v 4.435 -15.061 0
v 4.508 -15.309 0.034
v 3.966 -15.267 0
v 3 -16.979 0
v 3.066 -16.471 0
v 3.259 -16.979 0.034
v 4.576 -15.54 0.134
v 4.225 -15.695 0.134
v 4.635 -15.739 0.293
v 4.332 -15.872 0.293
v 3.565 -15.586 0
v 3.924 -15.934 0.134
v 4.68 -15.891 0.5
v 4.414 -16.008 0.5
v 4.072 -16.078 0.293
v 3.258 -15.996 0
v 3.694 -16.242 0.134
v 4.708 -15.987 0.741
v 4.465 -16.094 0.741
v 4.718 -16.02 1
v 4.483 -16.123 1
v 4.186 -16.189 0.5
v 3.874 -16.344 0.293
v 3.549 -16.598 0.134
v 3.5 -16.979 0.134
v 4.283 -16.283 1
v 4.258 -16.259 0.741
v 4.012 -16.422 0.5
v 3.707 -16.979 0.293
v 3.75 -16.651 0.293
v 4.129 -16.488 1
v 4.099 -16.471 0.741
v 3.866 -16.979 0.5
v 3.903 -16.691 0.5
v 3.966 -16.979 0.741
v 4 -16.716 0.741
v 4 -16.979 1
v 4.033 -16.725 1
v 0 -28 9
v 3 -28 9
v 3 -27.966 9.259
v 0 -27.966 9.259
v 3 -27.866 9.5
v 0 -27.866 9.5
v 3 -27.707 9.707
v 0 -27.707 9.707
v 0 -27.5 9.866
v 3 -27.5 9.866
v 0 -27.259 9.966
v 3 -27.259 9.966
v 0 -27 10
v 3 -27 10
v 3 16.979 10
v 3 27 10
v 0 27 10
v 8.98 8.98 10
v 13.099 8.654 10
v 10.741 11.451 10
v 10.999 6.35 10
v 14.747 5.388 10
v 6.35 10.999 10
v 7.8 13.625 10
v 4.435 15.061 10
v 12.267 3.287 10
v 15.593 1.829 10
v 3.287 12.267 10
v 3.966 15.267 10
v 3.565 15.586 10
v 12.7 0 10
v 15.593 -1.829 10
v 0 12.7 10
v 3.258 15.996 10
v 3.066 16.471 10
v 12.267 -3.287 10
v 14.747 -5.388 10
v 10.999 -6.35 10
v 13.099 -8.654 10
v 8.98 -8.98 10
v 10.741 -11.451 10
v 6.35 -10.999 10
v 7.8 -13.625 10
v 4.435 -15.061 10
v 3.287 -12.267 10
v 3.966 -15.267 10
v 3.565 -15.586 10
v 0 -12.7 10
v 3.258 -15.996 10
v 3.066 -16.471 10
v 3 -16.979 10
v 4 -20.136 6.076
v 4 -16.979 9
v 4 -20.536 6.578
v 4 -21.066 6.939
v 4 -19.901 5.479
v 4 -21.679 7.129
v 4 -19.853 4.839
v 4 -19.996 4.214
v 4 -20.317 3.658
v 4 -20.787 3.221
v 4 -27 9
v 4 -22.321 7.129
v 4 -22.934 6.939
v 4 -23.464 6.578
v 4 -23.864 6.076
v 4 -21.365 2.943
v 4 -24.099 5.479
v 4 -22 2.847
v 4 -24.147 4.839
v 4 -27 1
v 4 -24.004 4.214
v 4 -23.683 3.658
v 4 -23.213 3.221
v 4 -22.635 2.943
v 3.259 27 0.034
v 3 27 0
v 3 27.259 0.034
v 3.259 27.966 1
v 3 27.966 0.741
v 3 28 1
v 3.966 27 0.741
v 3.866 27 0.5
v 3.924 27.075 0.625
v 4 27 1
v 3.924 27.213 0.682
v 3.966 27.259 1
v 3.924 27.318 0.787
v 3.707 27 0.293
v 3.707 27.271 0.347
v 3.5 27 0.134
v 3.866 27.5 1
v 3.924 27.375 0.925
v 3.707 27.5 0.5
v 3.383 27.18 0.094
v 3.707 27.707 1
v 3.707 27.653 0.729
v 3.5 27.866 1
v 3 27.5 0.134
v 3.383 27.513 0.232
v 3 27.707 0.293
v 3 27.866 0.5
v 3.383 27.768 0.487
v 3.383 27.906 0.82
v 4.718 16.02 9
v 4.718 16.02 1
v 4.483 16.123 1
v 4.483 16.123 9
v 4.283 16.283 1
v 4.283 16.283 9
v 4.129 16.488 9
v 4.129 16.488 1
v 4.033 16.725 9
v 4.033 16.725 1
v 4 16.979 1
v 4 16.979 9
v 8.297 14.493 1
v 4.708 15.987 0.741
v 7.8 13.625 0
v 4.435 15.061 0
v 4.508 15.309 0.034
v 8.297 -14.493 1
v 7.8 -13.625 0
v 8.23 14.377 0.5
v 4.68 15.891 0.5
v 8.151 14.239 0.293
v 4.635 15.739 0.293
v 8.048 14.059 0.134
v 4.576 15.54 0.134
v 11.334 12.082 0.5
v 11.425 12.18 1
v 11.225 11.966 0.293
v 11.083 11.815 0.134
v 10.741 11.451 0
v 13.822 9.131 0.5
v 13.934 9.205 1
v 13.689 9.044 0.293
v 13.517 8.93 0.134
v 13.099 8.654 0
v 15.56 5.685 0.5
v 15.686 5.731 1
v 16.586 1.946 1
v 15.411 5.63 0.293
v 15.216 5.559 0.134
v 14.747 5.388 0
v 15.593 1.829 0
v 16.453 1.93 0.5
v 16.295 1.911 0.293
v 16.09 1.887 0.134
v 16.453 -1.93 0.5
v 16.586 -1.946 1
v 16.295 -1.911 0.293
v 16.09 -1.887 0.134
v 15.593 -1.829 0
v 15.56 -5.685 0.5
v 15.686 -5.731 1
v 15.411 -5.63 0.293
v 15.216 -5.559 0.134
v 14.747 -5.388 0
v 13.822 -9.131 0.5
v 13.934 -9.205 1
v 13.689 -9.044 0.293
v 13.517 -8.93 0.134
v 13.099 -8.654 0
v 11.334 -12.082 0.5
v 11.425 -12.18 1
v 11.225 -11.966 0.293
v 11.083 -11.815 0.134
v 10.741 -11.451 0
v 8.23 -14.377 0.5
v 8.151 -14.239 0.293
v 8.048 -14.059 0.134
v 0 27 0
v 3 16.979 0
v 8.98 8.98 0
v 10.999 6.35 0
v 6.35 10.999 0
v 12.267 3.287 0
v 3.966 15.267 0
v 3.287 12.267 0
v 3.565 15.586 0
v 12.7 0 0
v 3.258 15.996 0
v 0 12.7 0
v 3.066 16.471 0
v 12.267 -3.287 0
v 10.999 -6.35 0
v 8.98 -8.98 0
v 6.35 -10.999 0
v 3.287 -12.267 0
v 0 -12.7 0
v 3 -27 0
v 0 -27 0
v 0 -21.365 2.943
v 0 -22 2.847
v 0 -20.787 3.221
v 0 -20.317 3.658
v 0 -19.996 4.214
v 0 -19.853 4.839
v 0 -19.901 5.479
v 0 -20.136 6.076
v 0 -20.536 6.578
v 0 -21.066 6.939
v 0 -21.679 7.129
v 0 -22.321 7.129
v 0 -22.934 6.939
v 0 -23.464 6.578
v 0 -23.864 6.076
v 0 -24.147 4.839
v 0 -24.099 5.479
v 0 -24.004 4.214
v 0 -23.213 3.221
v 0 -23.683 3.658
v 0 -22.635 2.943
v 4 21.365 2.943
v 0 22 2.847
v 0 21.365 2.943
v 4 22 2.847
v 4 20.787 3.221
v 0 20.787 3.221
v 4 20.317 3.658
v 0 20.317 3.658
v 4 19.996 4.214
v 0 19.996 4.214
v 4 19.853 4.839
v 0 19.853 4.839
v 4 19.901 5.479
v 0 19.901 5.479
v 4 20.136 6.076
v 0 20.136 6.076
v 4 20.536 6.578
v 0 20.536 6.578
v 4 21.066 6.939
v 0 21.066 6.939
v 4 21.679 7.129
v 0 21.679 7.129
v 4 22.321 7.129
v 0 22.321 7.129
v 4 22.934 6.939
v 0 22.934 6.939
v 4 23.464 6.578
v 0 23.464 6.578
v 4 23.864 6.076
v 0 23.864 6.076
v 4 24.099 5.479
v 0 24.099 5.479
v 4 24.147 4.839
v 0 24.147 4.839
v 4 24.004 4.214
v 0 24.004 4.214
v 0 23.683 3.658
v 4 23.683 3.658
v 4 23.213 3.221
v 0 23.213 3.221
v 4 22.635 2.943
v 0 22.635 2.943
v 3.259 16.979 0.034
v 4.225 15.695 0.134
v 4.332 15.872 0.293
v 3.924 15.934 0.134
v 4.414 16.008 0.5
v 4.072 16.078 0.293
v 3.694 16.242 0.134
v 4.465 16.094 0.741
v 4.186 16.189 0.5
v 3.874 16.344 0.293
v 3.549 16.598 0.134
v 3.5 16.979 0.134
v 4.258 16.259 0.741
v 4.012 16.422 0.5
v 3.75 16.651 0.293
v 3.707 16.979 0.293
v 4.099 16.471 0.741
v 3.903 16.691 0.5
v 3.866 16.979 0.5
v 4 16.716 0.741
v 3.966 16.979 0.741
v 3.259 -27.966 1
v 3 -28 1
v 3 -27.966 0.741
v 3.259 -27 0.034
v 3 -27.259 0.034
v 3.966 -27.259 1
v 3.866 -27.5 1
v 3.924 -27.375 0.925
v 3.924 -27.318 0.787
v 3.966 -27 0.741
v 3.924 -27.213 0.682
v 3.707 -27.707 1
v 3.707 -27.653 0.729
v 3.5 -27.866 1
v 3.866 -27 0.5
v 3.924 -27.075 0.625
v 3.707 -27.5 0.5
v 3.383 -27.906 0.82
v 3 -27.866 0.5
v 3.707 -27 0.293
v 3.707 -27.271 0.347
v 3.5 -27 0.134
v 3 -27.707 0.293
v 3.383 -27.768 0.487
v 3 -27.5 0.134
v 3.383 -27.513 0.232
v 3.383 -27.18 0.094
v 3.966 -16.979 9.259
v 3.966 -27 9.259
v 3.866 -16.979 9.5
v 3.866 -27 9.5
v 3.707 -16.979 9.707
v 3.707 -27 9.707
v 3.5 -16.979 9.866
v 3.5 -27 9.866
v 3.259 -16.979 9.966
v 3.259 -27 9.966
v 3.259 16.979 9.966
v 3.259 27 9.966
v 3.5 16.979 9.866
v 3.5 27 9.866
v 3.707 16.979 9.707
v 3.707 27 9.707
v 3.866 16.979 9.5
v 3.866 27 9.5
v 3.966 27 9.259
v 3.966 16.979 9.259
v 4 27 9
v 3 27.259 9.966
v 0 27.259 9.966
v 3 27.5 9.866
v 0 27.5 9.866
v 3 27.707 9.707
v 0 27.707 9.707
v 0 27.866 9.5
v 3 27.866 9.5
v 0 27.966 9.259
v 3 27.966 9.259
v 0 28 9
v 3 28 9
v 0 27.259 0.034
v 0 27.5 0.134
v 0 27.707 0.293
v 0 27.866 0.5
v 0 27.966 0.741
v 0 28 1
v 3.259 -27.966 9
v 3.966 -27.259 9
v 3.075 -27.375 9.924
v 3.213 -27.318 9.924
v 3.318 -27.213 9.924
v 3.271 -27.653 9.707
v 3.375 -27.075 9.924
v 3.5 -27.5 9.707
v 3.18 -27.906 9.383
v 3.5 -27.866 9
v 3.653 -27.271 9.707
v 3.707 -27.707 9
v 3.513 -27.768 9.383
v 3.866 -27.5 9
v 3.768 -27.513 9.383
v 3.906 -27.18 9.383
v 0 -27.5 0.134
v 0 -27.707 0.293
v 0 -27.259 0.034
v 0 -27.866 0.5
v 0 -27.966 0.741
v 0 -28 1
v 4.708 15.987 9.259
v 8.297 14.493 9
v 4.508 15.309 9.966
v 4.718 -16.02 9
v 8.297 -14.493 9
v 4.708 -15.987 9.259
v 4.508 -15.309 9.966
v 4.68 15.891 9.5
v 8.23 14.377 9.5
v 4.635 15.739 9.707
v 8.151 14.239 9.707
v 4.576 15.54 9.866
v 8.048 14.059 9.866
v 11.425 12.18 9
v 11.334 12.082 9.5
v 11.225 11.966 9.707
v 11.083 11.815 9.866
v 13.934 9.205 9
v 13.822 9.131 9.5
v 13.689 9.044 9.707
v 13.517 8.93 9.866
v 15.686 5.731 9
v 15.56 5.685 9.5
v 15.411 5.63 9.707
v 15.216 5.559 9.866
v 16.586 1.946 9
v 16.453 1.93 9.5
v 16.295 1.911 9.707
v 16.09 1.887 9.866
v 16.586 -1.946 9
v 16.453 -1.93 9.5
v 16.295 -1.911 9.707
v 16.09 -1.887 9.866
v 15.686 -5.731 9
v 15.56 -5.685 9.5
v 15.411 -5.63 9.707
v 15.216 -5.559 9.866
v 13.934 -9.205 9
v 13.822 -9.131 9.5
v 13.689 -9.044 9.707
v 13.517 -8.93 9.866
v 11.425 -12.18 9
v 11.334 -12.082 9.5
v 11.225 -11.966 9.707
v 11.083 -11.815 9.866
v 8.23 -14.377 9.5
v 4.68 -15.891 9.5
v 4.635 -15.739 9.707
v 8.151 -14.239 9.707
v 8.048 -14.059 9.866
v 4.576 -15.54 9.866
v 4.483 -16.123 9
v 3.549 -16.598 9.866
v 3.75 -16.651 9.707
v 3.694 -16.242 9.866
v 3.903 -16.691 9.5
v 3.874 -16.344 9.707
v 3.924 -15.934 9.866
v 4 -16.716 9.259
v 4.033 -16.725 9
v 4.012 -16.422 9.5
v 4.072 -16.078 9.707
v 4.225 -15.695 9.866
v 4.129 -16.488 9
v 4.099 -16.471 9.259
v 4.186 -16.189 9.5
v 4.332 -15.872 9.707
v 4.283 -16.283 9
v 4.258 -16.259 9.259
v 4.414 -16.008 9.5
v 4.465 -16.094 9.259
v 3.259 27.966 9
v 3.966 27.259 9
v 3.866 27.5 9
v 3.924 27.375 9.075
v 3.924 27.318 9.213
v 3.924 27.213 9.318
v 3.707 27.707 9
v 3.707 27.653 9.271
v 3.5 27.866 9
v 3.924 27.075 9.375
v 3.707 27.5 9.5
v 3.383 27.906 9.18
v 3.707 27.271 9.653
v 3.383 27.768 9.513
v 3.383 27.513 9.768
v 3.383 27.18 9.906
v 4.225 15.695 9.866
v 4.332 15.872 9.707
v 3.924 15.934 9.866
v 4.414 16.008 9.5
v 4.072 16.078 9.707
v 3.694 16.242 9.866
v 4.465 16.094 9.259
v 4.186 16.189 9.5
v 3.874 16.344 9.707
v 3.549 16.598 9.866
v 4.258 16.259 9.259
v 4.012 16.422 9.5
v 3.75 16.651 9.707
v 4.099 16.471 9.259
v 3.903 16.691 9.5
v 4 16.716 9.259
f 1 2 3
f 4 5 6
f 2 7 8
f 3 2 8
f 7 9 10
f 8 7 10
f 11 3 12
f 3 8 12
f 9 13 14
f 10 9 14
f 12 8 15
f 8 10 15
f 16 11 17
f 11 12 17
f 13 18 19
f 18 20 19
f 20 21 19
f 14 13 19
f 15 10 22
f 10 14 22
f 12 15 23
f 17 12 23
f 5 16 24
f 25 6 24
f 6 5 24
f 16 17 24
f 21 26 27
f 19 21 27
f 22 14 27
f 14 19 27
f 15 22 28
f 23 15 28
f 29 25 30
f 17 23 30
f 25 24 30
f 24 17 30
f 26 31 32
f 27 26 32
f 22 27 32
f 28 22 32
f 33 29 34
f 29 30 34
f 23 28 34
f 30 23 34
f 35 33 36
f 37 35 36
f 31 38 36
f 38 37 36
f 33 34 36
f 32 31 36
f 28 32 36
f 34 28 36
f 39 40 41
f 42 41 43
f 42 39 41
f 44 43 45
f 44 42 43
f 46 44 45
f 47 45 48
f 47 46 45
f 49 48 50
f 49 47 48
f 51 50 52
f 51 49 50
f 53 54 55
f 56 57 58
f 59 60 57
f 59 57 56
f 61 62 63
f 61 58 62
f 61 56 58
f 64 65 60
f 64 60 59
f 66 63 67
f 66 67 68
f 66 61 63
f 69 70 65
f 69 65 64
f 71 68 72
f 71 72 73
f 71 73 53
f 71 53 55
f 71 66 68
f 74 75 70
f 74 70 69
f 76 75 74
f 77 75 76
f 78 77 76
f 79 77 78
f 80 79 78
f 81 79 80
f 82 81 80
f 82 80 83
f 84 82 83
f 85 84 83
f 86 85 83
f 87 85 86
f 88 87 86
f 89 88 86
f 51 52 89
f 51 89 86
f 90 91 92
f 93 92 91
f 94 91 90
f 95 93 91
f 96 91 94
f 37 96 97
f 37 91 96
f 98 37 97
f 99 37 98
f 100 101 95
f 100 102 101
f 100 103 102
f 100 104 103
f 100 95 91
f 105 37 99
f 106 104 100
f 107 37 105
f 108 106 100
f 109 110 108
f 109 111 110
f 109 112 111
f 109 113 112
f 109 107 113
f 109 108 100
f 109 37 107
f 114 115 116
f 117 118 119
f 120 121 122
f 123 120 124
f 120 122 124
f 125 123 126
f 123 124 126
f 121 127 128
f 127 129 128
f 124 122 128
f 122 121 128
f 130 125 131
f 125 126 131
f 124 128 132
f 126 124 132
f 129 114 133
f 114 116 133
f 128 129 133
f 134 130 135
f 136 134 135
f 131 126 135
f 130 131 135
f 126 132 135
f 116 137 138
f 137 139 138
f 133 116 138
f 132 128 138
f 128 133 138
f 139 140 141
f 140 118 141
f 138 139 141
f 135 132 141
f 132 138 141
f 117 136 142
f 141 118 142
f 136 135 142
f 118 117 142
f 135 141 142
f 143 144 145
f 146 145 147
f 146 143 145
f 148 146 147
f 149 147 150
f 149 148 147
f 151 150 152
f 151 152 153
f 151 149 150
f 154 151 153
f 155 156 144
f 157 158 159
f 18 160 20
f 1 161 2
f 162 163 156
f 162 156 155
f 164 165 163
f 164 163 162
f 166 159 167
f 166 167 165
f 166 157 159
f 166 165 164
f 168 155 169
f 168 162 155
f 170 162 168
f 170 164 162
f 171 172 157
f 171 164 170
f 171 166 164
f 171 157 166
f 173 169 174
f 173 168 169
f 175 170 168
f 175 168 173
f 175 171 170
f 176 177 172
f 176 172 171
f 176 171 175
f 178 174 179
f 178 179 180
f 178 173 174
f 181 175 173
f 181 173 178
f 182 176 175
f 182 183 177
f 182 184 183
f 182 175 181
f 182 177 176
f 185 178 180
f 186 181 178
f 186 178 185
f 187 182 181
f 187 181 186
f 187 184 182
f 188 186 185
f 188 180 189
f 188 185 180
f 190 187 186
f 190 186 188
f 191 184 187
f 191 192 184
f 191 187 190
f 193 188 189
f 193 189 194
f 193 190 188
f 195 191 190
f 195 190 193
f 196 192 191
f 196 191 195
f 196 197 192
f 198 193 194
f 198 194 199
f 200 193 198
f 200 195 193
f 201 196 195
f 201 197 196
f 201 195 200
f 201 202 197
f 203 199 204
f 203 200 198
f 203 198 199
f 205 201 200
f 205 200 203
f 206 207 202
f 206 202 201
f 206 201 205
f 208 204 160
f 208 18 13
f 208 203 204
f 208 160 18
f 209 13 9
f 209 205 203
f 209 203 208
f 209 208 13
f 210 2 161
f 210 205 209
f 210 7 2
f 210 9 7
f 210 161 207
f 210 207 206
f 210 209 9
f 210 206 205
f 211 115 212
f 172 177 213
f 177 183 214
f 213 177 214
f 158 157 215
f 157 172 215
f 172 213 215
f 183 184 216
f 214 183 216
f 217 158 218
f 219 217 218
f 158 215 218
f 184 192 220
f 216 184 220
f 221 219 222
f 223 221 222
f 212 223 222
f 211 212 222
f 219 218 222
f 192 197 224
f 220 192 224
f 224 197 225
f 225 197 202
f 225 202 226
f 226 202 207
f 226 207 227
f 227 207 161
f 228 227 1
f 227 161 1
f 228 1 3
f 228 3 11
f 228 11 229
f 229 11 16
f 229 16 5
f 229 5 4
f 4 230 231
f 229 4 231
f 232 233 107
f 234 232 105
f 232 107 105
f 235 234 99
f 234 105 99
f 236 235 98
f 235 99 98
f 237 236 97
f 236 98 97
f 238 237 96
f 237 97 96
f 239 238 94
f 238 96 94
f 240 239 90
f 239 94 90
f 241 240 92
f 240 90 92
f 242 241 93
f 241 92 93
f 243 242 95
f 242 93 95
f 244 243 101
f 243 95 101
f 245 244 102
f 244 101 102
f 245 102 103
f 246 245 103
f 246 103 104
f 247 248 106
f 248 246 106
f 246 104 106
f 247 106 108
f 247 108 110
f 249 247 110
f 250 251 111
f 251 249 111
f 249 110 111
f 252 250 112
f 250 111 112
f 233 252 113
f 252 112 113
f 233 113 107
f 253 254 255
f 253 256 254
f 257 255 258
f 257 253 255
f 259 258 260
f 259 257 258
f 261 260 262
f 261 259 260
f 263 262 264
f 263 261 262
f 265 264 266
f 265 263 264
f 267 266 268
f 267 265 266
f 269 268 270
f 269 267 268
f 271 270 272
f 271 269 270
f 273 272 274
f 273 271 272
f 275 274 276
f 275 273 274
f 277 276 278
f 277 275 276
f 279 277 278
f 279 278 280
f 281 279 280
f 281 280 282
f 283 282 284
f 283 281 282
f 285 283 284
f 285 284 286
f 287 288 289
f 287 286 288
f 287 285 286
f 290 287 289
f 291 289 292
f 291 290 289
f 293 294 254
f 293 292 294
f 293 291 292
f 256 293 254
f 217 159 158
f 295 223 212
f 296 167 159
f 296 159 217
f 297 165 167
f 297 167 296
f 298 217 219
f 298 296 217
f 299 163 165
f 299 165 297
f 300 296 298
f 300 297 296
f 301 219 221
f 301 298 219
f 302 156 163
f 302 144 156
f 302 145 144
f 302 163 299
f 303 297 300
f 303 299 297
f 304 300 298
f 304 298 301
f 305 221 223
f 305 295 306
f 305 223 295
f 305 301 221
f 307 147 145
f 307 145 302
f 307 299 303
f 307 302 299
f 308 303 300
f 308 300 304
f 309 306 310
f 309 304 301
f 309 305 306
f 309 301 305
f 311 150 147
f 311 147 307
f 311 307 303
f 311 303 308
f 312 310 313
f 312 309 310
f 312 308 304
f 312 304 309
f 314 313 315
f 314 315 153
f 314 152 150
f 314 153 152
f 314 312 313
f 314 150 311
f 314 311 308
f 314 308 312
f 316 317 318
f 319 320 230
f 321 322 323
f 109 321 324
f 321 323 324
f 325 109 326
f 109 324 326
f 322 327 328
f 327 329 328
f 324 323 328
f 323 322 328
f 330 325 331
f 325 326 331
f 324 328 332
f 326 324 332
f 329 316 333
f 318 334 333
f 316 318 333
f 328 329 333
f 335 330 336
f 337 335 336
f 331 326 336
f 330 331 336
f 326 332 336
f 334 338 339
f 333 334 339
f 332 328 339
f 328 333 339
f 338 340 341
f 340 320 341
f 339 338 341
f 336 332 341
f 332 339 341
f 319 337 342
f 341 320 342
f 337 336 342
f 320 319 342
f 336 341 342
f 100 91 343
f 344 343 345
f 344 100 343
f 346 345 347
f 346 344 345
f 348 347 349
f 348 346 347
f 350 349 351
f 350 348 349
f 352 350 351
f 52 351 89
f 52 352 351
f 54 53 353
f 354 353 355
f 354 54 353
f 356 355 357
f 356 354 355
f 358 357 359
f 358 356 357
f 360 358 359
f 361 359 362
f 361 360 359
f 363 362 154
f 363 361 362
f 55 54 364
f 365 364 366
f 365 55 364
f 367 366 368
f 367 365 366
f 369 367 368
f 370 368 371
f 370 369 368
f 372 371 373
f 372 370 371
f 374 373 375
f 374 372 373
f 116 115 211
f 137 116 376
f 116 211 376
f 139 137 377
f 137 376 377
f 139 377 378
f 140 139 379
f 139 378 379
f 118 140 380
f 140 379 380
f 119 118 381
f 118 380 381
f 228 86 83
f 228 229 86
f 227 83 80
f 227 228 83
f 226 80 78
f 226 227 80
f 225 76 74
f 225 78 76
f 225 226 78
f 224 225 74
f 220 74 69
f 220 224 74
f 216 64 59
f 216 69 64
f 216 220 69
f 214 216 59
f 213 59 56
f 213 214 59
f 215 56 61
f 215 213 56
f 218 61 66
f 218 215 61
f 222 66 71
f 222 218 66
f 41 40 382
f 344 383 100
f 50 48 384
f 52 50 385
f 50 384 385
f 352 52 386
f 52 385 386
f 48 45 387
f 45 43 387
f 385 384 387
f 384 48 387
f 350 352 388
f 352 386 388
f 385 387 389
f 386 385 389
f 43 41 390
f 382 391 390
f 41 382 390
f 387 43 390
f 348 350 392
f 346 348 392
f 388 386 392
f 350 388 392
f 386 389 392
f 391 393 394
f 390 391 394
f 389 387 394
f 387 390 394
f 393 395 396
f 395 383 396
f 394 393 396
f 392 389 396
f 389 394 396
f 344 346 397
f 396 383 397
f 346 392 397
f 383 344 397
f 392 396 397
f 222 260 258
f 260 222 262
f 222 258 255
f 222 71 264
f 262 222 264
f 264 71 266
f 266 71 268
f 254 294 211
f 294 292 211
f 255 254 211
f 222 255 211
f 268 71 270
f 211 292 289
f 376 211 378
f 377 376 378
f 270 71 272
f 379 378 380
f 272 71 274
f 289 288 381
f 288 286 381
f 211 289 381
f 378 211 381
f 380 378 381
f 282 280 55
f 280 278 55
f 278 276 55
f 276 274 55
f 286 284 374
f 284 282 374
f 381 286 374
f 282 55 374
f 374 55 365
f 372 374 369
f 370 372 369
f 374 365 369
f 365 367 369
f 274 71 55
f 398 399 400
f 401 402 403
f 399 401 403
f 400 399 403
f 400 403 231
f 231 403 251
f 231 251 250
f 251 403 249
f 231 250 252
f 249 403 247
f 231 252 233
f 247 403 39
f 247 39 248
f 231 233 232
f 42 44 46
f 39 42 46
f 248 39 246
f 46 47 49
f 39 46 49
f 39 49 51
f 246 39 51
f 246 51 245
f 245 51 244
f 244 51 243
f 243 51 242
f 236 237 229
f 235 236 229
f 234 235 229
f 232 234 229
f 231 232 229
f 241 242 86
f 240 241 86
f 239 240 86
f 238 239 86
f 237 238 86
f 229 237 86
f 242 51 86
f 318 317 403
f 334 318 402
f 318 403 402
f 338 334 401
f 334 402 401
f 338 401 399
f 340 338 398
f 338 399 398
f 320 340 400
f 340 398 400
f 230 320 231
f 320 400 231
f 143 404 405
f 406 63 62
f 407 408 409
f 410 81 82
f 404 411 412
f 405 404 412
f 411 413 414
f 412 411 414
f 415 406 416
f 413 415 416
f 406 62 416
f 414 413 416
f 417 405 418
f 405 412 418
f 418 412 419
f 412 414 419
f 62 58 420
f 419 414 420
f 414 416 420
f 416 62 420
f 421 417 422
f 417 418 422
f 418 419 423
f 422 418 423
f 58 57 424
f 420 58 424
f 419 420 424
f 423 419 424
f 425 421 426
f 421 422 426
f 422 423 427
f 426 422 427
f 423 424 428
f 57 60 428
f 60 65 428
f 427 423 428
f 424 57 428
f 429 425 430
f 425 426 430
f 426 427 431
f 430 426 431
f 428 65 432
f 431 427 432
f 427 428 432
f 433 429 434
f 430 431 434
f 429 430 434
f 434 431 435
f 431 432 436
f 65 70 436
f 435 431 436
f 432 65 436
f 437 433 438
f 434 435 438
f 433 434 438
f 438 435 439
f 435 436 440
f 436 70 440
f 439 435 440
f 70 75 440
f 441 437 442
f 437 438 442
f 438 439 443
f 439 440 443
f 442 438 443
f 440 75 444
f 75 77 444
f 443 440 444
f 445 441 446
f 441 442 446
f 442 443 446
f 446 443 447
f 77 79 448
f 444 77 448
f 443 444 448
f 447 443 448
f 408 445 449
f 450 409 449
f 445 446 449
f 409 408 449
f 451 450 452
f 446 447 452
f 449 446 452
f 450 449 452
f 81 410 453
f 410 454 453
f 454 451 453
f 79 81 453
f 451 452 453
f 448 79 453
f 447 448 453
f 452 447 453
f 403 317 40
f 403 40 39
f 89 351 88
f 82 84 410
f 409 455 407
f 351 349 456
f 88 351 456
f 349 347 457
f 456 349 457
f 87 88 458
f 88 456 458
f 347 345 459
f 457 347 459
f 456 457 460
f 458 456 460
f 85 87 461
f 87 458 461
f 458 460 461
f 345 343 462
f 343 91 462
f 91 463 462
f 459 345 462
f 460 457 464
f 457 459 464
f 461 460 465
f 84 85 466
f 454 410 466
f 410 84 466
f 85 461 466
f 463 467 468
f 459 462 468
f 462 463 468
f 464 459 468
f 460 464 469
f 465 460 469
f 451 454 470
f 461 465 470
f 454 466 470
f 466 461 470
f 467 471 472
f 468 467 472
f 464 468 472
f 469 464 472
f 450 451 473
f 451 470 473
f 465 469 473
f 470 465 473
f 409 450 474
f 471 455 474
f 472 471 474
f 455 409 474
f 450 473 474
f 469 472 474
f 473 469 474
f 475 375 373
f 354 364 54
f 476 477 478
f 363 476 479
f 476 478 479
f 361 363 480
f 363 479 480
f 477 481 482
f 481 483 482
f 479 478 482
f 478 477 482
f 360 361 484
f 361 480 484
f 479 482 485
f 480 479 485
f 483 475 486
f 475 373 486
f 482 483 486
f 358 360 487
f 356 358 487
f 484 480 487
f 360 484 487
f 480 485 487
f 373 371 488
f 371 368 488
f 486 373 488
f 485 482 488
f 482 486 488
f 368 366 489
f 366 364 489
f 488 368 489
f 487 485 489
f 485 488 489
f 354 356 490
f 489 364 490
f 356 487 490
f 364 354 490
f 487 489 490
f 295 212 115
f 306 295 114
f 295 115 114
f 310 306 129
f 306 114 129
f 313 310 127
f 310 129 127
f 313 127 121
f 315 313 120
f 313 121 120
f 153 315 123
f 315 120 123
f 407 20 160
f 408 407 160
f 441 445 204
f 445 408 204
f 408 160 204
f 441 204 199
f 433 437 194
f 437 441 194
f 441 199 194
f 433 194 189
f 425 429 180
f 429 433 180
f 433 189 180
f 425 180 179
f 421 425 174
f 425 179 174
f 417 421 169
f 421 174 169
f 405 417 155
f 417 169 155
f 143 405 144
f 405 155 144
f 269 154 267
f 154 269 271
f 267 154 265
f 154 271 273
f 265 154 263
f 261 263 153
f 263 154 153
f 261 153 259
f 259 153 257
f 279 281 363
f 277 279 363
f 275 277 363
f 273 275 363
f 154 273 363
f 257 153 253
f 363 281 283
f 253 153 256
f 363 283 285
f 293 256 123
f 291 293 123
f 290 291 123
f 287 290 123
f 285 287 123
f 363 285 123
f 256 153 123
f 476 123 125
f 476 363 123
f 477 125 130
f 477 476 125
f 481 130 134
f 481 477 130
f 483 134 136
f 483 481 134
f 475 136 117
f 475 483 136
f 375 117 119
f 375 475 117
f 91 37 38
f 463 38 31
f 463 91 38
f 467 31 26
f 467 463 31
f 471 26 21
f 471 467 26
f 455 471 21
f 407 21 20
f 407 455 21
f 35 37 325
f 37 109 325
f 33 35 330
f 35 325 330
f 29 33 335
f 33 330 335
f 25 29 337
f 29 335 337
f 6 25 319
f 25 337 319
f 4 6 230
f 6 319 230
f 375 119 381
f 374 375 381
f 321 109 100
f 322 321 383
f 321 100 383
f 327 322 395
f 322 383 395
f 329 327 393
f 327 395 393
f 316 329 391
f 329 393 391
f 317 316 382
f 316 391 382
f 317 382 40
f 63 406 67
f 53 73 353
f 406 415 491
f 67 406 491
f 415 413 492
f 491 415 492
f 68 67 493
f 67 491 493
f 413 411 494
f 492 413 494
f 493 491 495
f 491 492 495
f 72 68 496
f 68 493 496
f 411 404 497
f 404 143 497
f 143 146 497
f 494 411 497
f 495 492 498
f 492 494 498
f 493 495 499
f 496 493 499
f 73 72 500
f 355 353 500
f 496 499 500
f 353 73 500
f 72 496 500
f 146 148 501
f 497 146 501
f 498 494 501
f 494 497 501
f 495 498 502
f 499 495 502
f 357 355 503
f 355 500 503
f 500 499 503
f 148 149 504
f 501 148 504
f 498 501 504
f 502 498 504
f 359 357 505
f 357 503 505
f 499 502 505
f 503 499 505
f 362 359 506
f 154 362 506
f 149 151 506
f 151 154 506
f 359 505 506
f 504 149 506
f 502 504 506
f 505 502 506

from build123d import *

# Parameters (mm, degrees)
SKETCH1_R                                         = 16.7
SKETCH1_R_2                                       = 12.7
BOSS_EXTRUDE1_DEPTH                               = 10
SKETCH2_W                                         = 22.16607393
SKETCH2_H                                         = 10
SKETCH2_W_2                                       = 4
SKETCH2_H_2                                       = 30
BOSS_EXTRUDE2_DEPTH                               = 10
SKETCH4_W                                         = 8
SKETCH4_H                                         = 11.78611706
BOSS_EXTRUDE3_DEPTH                               = 10
FILLET3_R                                         = 1
CSK_FOR_6_FLAT_HEAD_MACHINE_SCREW_100_D           = 4.3053
CSK_FOR_6_FLAT_HEAD_MACHINE_SCREW_100_CSINK_D     = 7.0866
CSK_FOR_6_FLAT_HEAD_MACHINE_SCREW_100_CSINK_ANGLE = 100
INTERSECT3_START                                  = -42.1
INTERSECT3_OUTLINE_R                              = 2.15265
INTERSECT3_DEPTH                                  = 42.1


# Read off the part's stored shape, not the designer's step: CSK for #4 Flat Head Machine Screw (100)1, Intersect3
with BuildPart() as part:
    # Sketch1 → Boss-Extrude1 (new body)
    with BuildSketch(Plane.XY):
        Circle(SKETCH1_R)
        Circle(SKETCH1_R_2, mode=Mode.SUBTRACT)
    extrude(amount=BOSS_EXTRUDE1_DEPTH)

    # Sketch2 → Boss-Extrude2 (add)
    with BuildSketch(Plane(origin=(0, 0, 0), x_dir=(-1, 0, 0), z_dir=(0, 0, -1))):
        with Locations((27.016963035, 0)):
            Rectangle(SKETCH2_W, SKETCH2_H)
        with Locations((40.1, 0)):
            Rectangle(SKETCH2_W_2, SKETCH2_H_2)
    extrude(amount=-BOSS_EXTRUDE2_DEPTH)

    # Sketch4 → Boss-Extrude3 (add)
    with BuildSketch(Plane(origin=(0, 0, 0), x_dir=(-1, 0, 0), z_dir=(0, 0, -1))):
        with Locations((0, 22.10694147)):
            Rectangle(SKETCH4_W, SKETCH4_H)
    boss_extrude3 = extrude(amount=-BOSS_EXTRUDE3_DEPTH)

    # Mirror1: Boss-Extrude3 across plane
    add(boss_extrude3.mirror(Plane.ZX))

    # Fillet3
    fillet3_edges = [part.edges().sort_by_distance(p)[0] for p in [
        (-11.435827246, -12.170121413, 10),
        (-11.435827246, -12.170121413, 0),
        (-38.1, 10, 10),
        (-40.1, -15, 10),
        (-27.016963035, -5, 10),
        (-38.1, -10, 0),
        (-40.1, 15, 0),
        (-38.1, 10, 0),
        (-27.016963035, 5, 0),
        (-38.1, -10, 10),
        (-40.1, -15, 0),
        (-40.1, 15, 10),
        (-15.93392607, -5, 5),
        (-27.016963035, -5, 0),
        (-27.016963035, 5, 10),
        (-15.93392607, 5, 5),
        (-11.435827246, 12.170121413, 0),
        (-11.435827246, 12.170121413, 10),
        (-4, 22.10694147, 0),
        (0, 28, 0),
        (4, 22.10694147, 0),
        (0, 28, 10),
        (4, 28, 5),
        (4, 22.10694147, 10),
        (4, 16.21388294, 5),
        (-4, 16.21388294, 5),
        (-4, 22.10694147, 10),
        (-4, 28, 5),
        (16.7, 0, 0),
        (16.7, 0, 10),
        (-4, -16.21388294, 5),
        (-4, -22.10694147, 0),
        (-4, -28, 5),
        (0, -28, 0),
        (4, -28, 5),
        (4, -22.10694147, 0),
        (4, -16.21388294, 5),
        (-4, -22.10694147, 10),
        (0, -28, 10),
        (4, -22.10694147, 10),
    ]]
    fillet(fillet3_edges, radius=FILLET3_R)

    # CSK for _4 Flat Head Machine Screw _ 2 → CSK for #4 Flat Head Machine Screw (100)1 (revolve, cut)
    with BuildSketch(Plane(origin=(0, -9, 5), x_dir=(0, 1, 0), z_dir=(0, 0, -1))):
        Polygon((0, -42.1), (1.7272, -42.1), (1.7272, -39.048434313), (2.8575, -38.1), (0, -38.1), align=None)
    csk_for_4_flat_head_machine_screw_100 = revolve(axis=Axis((0, -9, 5), (1, 0, 0)), mode=Mode.SUBTRACT)

    # Mirror2: CSK for #4 Flat Head Machine Screw (100)1 across plane
    add(csk_for_4_flat_head_machine_screw_100.mirror(Plane.ZX), mode=Mode.SUBTRACT)

    # CSK for #6 Flat Head Machine Screw (100)5 (through all)
    with Locations(Plane.ZY.offset(4)):
        with Locations((5, -22)):
            csk_for_6_flat_head_machine_screw_100 = CounterSinkHole(CSK_FOR_6_FLAT_HEAD_MACHINE_SCREW_100_D / 2, CSK_FOR_6_FLAT_HEAD_MACHINE_SCREW_100_CSINK_D / 2, counter_sink_angle=CSK_FOR_6_FLAT_HEAD_MACHINE_SCREW_100_CSINK_ANGLE)

    # Mirror5: CSK for #6 Flat Head Machine Screw (100)5 across plane
    add(csk_for_6_flat_head_machine_screw_100.mirror(Plane.ZX), mode=Mode.SUBTRACT)

    # Intersect3 outline → Intersect3 (cut)
    with BuildSketch(Plane.YZ.offset(INTERSECT3_START)):
        with BuildLine():
            ThreePointArc((28, 9), (27.707106781, 9.707106781), (27, 10))
            Line((27, 10), (-27, 10))
            ThreePointArc((-27, 10), (-27.707106781, 9.707106781), (-28, 9))
            Line((-28, 9), (-28, 1))
            ThreePointArc((-28, 1), (-27.707106781, 0.292893219), (-27, 0))
            Line((-27, 0), (27, 0))
            ThreePointArc((27, 0), (27.707106781, 0.292893219), (28, 1))
            Line((28, 1), (28, 9))
        make_face()
        with Locations((22, 5)):
            Circle(INTERSECT3_OUTLINE_R, mode=Mode.SUBTRACT)
        with Locations((-22, 5)):
            Circle(INTERSECT3_OUTLINE_R, mode=Mode.SUBTRACT)
    extrude(amount=INTERSECT3_DEPTH, mode=Mode.SUBTRACT)


solid = part.part
